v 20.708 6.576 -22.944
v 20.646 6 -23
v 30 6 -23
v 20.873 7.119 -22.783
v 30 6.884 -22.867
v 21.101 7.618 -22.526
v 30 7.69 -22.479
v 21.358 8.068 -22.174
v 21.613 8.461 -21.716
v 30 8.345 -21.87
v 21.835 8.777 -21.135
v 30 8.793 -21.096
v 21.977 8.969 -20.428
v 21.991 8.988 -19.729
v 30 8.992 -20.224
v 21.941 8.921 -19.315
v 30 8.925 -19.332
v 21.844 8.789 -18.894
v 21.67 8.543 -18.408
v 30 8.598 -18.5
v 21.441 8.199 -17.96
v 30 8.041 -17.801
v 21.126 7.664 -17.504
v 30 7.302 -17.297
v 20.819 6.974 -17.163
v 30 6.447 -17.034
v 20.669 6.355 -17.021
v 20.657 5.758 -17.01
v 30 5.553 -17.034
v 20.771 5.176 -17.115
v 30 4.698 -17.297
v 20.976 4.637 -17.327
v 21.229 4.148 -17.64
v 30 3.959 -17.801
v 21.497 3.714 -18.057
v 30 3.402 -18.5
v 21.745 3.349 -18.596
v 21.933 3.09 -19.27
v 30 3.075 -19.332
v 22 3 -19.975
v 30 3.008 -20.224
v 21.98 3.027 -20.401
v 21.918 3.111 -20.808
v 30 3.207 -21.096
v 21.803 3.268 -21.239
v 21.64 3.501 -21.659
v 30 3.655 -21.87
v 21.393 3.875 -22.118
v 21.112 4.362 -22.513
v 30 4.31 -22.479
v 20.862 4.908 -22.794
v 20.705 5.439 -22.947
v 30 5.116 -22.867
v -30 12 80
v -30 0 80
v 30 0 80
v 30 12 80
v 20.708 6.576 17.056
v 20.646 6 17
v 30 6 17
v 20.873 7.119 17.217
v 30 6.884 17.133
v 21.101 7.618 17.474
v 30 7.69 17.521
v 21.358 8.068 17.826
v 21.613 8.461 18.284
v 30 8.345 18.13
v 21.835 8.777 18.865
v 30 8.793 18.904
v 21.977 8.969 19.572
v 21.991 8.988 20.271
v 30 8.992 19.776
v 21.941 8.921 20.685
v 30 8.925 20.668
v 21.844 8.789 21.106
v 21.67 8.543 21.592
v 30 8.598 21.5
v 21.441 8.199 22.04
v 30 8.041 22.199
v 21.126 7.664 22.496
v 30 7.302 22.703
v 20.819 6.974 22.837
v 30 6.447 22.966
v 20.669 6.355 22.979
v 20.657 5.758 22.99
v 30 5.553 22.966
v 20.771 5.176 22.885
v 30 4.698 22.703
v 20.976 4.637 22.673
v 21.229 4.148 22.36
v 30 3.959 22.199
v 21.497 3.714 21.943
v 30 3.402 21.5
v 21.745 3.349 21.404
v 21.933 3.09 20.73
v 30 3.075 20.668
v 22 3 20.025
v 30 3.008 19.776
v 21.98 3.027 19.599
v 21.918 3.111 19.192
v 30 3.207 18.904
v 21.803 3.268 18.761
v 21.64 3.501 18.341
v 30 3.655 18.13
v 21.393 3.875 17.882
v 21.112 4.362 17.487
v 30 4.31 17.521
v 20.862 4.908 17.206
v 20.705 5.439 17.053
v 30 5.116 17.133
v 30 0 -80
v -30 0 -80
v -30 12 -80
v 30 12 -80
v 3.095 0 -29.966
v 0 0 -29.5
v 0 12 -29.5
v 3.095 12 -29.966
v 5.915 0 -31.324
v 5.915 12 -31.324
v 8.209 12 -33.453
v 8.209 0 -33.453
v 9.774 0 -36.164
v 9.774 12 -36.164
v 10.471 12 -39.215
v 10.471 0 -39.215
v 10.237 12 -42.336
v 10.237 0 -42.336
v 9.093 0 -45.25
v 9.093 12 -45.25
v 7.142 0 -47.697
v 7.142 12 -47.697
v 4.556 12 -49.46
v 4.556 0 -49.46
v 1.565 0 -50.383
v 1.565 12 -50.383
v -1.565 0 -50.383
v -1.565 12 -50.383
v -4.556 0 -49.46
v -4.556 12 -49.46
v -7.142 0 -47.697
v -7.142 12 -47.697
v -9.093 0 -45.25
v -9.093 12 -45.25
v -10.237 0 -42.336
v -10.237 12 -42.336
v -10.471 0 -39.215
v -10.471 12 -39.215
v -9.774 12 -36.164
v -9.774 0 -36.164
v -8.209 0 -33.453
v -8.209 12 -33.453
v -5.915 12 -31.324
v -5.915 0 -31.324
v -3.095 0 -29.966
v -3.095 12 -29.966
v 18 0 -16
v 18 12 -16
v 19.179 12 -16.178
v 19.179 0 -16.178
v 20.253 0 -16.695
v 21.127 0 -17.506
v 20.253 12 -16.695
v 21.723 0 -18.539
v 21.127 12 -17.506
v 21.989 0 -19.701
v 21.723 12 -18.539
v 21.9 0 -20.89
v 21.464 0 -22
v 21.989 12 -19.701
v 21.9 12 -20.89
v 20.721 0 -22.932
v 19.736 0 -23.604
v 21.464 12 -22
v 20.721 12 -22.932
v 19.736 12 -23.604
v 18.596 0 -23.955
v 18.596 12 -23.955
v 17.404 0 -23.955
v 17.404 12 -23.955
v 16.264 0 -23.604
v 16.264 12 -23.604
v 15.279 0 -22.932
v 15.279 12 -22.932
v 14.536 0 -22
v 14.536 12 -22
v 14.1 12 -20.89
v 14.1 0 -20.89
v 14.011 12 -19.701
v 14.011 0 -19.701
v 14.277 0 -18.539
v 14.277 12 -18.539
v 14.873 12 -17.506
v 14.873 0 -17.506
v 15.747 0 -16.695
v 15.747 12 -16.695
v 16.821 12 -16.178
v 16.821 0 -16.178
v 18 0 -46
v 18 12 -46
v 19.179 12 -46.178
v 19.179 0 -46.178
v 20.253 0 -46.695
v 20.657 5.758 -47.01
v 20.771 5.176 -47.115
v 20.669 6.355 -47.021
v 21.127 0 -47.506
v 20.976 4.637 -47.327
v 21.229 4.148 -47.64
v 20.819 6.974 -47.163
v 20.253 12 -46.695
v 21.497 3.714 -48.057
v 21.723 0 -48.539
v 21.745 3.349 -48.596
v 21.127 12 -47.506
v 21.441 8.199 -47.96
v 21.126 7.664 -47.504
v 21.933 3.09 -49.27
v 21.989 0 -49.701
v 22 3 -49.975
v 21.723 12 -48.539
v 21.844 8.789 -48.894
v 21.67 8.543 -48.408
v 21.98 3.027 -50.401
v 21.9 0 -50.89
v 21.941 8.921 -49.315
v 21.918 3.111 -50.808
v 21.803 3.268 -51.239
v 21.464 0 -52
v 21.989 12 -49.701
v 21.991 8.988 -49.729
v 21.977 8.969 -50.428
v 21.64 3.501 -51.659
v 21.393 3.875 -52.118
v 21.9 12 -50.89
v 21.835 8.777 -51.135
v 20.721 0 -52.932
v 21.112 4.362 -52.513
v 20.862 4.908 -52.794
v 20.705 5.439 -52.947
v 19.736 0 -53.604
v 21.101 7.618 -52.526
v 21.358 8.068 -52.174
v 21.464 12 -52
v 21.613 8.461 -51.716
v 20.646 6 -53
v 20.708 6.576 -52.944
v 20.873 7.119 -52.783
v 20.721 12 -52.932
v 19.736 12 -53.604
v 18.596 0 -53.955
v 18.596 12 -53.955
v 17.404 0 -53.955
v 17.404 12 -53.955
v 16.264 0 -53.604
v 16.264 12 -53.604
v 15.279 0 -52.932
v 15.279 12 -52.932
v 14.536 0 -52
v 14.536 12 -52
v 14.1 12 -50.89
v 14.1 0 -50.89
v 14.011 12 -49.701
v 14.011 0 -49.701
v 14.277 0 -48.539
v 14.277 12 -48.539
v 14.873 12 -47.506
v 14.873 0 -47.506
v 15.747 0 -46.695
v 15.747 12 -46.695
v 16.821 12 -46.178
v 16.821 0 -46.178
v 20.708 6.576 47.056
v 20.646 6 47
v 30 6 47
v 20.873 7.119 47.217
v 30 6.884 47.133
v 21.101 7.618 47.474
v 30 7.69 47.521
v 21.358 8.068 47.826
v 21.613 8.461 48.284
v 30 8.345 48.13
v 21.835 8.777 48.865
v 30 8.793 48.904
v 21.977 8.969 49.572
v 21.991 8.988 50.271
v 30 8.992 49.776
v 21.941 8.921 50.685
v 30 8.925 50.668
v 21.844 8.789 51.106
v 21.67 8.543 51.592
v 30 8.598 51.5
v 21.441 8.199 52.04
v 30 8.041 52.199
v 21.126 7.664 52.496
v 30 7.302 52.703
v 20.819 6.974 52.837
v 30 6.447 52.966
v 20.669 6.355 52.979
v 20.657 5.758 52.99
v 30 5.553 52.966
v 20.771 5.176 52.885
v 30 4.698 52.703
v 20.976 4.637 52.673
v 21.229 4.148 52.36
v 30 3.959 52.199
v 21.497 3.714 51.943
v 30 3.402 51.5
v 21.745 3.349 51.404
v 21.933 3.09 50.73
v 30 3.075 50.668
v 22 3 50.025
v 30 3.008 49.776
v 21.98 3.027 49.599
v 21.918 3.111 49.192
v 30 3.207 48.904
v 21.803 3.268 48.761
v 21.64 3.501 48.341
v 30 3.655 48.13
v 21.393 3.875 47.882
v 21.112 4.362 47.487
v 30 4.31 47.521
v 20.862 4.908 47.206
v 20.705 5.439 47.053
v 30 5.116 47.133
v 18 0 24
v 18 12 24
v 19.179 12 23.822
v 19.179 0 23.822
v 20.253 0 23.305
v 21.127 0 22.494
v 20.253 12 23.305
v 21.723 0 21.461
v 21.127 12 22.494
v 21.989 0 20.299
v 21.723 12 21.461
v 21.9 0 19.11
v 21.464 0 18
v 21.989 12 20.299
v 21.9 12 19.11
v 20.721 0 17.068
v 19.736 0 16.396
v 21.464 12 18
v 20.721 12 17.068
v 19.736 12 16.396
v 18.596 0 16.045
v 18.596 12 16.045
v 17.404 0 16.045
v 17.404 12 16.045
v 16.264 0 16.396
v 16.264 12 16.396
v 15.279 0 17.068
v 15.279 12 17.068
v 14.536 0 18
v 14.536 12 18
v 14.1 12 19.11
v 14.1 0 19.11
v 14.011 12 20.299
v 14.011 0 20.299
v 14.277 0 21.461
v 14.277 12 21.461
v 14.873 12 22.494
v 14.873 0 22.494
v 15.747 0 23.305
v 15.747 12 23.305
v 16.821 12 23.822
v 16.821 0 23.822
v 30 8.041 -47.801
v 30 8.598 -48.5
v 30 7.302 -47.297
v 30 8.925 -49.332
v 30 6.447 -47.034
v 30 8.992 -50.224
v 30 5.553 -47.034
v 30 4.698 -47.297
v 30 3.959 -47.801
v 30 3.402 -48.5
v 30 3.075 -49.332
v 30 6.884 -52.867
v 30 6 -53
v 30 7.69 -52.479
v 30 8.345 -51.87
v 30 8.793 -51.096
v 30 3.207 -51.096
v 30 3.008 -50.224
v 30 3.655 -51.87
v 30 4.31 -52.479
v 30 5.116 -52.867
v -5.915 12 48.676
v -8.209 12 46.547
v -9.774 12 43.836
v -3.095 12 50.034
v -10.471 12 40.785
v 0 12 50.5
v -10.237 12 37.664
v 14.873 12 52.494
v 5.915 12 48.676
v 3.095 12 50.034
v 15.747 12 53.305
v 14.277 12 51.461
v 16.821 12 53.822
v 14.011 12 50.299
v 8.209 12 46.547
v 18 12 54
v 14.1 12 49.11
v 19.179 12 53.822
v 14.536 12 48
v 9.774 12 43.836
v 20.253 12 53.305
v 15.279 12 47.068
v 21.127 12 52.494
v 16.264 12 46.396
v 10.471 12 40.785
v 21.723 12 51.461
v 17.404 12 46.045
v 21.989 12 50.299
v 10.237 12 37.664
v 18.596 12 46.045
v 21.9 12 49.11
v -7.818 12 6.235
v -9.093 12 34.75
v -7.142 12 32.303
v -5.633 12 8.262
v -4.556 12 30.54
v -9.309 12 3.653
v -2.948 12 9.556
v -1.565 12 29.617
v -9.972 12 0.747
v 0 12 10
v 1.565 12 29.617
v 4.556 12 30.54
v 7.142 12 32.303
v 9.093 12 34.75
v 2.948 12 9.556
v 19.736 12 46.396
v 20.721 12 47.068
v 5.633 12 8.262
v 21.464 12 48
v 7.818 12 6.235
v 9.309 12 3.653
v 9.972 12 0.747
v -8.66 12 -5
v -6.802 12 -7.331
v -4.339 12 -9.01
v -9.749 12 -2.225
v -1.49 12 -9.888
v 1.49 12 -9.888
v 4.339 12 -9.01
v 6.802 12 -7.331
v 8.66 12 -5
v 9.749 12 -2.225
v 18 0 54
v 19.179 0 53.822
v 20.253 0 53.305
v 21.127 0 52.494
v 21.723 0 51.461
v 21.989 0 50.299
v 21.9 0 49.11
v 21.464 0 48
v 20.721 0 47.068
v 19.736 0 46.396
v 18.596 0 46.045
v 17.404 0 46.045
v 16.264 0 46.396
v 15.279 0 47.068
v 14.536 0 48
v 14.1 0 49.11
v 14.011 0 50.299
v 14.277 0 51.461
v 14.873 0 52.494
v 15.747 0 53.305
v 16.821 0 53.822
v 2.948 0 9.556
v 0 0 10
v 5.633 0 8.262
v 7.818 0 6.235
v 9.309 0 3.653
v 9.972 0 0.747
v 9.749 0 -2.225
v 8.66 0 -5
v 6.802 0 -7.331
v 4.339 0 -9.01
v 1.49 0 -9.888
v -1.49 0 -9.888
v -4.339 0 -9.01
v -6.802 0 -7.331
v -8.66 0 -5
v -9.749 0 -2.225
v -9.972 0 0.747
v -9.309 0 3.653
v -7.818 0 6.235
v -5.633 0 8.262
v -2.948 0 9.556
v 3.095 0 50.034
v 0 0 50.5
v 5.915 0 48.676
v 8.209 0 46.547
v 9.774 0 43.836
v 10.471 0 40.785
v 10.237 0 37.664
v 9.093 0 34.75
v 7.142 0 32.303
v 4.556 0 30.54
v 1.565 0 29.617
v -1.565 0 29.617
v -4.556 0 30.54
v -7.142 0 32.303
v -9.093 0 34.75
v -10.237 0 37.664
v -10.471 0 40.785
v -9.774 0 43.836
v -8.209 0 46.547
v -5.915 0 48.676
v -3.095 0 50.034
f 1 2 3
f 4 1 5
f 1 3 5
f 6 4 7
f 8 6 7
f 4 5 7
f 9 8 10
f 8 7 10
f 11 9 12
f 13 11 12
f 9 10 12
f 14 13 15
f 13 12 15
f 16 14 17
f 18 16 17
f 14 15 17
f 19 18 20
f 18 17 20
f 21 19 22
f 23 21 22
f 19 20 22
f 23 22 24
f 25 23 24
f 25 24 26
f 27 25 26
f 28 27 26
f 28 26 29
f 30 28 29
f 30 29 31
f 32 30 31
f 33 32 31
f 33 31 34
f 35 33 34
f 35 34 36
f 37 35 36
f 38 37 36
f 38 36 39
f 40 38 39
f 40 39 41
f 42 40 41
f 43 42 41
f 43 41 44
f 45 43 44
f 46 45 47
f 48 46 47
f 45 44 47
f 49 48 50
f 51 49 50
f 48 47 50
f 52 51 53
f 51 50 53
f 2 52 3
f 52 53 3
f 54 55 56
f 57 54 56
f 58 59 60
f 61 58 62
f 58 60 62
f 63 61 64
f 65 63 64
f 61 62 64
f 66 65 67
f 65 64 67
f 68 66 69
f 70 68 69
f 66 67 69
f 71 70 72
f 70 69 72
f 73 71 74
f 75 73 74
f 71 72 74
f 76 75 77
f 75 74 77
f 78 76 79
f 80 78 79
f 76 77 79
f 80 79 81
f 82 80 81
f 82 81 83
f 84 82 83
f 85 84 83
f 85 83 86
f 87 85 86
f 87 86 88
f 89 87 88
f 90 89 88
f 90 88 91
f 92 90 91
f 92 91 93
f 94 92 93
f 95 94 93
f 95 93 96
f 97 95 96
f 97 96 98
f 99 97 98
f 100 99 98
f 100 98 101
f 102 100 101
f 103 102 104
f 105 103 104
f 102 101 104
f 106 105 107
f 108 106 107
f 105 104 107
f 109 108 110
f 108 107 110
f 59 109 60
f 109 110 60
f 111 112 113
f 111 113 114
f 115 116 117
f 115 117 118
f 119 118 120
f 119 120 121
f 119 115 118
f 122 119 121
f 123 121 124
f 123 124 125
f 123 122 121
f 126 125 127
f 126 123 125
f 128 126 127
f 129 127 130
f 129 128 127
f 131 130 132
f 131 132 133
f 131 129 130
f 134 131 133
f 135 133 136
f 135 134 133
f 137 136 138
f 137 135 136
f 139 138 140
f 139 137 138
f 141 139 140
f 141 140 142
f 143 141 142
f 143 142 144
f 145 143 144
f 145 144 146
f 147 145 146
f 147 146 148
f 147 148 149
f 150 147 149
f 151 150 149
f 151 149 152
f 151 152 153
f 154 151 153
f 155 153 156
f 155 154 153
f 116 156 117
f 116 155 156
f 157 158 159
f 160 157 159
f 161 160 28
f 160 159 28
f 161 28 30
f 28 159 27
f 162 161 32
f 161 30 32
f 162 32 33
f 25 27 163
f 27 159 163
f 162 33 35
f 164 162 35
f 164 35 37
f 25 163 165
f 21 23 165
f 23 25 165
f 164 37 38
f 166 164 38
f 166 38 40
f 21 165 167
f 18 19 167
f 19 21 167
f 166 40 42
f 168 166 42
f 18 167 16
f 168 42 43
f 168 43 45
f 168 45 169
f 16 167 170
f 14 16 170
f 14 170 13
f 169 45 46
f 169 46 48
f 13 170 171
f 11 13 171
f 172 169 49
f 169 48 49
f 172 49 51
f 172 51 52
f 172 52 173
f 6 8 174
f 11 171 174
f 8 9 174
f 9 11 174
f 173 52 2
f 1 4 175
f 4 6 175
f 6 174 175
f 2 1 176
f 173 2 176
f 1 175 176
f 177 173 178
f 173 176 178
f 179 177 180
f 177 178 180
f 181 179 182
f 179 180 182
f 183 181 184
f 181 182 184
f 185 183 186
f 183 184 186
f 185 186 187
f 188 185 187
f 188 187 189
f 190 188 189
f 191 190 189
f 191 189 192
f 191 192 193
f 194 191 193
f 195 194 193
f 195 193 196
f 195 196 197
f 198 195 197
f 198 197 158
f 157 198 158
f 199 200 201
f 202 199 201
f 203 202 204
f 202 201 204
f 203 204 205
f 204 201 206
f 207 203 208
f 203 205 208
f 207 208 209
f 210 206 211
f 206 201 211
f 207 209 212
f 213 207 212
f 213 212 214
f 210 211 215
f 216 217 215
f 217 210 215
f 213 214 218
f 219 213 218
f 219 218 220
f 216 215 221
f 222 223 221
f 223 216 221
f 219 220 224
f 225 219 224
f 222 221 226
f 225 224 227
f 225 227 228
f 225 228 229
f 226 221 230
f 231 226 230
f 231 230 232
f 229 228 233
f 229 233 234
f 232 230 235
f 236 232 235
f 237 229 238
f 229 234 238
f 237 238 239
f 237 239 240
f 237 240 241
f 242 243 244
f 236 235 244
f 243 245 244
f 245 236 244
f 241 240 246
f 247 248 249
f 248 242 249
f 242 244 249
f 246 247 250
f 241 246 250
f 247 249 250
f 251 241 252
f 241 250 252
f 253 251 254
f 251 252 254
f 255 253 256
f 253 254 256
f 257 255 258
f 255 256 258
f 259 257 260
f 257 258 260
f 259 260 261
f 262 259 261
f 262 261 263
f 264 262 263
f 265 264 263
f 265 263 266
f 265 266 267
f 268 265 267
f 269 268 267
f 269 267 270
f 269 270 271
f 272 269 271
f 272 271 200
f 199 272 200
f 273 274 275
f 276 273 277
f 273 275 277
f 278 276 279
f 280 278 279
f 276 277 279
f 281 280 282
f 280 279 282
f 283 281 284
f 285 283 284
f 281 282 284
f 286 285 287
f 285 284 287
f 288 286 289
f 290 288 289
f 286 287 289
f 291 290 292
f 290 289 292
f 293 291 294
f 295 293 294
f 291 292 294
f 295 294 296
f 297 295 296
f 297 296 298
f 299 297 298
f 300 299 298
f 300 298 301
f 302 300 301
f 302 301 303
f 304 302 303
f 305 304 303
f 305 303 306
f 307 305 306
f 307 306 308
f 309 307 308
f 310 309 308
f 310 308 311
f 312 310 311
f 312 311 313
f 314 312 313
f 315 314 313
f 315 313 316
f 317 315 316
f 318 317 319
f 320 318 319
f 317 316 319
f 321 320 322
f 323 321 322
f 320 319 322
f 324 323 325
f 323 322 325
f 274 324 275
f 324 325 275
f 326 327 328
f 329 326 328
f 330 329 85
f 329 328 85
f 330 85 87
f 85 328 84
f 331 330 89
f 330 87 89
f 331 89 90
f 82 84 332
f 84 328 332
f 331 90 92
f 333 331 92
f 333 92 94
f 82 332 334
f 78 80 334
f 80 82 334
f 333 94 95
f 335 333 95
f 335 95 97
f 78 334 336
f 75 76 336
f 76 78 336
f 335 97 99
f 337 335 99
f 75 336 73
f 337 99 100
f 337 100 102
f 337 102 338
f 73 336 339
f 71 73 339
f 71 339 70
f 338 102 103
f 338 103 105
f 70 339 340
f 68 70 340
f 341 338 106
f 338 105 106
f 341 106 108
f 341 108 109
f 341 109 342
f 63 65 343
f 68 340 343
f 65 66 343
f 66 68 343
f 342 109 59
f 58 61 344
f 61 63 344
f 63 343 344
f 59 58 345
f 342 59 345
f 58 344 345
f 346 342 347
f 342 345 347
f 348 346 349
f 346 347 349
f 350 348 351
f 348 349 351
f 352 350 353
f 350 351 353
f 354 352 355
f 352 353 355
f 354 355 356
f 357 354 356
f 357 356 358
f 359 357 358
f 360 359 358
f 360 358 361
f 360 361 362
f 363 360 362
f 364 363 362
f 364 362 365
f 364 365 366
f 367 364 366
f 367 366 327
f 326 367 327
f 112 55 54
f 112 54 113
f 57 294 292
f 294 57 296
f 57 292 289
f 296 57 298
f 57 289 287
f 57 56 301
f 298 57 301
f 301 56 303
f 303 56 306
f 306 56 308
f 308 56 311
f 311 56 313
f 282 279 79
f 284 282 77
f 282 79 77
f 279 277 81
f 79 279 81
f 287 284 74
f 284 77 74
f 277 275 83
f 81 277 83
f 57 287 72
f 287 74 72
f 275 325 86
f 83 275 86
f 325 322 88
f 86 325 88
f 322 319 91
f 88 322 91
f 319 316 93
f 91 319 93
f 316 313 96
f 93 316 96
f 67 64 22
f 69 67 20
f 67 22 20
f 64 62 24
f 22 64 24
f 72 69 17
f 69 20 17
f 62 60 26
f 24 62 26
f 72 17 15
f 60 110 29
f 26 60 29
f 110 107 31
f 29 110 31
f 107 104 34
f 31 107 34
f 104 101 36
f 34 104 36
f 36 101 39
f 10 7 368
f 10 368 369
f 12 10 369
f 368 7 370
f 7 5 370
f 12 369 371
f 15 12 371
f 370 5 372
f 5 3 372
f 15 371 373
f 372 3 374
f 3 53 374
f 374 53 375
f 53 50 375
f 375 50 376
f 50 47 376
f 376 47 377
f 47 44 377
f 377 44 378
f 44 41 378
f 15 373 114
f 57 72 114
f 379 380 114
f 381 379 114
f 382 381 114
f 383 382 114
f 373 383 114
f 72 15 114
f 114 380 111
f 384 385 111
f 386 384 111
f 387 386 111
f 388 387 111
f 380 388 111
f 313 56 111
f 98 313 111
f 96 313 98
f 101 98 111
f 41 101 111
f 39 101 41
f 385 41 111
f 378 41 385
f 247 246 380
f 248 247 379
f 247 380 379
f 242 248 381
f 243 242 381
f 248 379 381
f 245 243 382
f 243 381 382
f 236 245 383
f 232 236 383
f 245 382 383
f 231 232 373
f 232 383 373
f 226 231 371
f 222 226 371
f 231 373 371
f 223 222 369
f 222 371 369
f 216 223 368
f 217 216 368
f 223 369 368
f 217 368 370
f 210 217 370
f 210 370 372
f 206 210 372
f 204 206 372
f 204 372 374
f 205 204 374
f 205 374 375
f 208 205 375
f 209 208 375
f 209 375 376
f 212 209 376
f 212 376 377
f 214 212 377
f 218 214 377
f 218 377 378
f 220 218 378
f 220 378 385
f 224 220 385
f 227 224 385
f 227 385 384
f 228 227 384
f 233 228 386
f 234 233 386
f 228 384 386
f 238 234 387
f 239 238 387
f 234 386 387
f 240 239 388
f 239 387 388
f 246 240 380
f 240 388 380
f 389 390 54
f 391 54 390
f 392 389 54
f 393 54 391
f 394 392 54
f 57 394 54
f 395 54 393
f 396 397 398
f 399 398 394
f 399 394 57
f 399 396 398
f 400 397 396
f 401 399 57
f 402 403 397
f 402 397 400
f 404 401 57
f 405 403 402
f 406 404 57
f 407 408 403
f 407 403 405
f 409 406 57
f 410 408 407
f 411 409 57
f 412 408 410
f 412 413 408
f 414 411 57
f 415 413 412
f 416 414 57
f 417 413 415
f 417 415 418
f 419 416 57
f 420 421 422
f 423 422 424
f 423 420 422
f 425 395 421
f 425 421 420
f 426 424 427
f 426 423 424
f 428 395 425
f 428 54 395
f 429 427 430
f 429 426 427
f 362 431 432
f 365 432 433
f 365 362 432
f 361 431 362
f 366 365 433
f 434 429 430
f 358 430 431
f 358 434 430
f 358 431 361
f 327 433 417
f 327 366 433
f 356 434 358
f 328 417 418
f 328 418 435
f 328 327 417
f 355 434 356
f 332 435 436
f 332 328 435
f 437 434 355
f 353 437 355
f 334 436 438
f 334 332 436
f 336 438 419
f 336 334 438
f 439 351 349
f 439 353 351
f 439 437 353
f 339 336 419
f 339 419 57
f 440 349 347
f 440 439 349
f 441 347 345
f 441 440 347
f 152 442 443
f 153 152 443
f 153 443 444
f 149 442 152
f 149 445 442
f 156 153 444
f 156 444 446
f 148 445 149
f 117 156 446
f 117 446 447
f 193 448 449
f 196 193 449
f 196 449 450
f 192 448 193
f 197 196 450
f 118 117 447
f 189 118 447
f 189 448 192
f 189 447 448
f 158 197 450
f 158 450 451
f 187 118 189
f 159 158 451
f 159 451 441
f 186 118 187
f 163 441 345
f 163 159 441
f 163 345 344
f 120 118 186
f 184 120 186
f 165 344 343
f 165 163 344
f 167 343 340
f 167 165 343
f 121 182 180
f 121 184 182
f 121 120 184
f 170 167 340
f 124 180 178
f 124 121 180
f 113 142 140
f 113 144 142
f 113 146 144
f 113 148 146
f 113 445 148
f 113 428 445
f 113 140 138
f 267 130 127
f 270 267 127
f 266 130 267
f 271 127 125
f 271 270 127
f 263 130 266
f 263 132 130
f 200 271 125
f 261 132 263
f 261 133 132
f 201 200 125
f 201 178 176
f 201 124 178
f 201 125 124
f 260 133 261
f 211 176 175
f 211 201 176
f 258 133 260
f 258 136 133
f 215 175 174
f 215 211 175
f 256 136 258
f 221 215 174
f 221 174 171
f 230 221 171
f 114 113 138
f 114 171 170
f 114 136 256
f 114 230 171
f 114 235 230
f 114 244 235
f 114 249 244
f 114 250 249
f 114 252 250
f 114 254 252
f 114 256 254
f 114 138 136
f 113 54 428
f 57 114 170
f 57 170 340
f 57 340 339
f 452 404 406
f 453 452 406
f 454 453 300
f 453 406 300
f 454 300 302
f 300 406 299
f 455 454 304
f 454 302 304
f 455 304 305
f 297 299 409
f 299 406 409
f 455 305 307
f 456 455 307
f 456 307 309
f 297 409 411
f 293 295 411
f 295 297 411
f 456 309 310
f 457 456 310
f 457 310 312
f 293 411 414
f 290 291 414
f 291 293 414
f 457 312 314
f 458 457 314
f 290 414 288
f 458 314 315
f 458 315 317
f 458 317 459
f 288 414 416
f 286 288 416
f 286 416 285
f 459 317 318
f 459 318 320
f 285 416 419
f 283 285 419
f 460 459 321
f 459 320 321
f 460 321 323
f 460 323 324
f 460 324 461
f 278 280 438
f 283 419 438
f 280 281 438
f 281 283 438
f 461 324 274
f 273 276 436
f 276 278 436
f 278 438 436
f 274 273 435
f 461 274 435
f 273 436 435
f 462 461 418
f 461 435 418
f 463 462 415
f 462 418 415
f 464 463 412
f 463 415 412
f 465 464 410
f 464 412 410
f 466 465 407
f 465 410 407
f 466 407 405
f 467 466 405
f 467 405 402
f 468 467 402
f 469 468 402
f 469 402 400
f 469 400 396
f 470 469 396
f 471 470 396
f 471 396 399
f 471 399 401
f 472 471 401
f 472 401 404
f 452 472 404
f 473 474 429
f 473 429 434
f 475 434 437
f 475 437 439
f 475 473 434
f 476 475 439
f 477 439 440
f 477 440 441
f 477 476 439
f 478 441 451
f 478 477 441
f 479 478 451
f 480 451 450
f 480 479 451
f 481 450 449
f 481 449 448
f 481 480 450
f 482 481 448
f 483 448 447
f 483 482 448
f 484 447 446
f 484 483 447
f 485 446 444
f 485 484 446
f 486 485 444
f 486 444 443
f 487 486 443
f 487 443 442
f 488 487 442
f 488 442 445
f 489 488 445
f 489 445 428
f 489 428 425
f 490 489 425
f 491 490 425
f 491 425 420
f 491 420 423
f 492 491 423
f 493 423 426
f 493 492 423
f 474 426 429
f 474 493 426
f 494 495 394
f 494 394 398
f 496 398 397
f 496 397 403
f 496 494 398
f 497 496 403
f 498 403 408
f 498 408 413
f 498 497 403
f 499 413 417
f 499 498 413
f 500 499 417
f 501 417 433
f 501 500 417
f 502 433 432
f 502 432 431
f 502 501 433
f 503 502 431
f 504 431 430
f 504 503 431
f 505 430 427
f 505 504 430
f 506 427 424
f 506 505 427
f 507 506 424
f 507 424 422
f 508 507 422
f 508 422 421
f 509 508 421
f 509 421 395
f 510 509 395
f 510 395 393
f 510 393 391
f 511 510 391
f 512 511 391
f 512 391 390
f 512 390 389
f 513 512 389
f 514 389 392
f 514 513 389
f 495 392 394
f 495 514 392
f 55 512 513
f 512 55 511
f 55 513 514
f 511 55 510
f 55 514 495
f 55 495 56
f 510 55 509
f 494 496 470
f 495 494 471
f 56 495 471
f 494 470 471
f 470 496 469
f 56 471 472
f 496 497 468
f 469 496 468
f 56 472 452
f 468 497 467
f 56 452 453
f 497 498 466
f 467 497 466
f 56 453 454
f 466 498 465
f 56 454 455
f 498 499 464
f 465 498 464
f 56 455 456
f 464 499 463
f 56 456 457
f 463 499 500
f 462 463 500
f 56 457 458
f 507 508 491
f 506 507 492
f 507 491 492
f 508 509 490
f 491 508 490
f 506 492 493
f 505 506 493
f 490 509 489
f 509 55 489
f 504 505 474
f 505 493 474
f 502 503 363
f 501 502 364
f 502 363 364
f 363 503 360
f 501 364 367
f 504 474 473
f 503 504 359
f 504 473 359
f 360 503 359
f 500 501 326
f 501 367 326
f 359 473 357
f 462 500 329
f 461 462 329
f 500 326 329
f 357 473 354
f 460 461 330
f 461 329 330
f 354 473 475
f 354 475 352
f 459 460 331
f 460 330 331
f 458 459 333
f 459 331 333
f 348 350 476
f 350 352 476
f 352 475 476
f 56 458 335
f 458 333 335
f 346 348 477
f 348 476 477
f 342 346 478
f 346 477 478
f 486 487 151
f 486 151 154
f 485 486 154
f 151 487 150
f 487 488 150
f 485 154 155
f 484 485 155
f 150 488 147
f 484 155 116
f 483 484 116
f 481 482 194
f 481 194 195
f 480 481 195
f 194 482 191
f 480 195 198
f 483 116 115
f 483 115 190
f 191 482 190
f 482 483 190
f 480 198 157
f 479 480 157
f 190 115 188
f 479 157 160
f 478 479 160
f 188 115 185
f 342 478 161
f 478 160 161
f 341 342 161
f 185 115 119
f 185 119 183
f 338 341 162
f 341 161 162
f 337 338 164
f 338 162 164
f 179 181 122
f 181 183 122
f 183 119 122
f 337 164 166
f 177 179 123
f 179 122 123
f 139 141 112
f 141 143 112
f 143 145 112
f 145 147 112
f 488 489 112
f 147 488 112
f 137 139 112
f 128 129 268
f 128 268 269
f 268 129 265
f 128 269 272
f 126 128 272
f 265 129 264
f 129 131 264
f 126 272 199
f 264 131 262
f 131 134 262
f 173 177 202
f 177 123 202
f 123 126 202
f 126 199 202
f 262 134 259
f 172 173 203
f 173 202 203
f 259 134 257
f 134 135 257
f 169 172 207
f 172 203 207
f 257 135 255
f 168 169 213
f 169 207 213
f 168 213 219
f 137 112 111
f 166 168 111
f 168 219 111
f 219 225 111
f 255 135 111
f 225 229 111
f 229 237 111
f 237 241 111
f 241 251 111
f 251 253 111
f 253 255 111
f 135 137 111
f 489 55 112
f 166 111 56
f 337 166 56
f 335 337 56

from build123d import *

# Parameters (mm, degrees)
SKETCH1_W           = 60
SKETCH1_H           = 160
SKETCH1_R           = 10
SKETCH1_R_2         = 10.5
BOSS_EXTRUDE1_DEPTH = 12
CUT_EXTRUDE1_REACH  = 88.279
SKETCH2_R           = 4
CUT_EXTRUDE2_REACH  = 102.717
SKETCH3_R           = 3


with BuildPart() as part:
    # Sketch1 → Boss-Extrude1 (new body)
    with BuildSketch(Plane(origin=(0, 0, 0), x_dir=(1, 0, 0), z_dir=(0, 1, 0))):
        Rectangle(SKETCH1_W, SKETCH1_H)
        with Locations(Location((0, 0, 0), (0, 0, 270))):
            Circle(SKETCH1_R, mode=Mode.SUBTRACT)
        with Locations(Location((0, 40, 0), (0, 0, 270))):
            Circle(SKETCH1_R_2, mode=Mode.SUBTRACT)
        with Locations(Location((0, -40, 0), (0, 0, 270))):
            Circle(SKETCH1_R_2, mode=Mode.SUBTRACT)
    extrude(amount=BOSS_EXTRUDE1_DEPTH)

    # Sketch2 → Cut-Extrude1 (cut, up to next)
    with BuildSketch(Plane(origin=(0, 12, 0), x_dir=(1, 0, 0), z_dir=(0, 1, 0)), mode=Mode.PRIVATE) as cut_extrude1_sk1:
        with Locations(Location((18, 50, 0), (0, 0, 270))):
            Circle(SKETCH2_R)
    cut_extrude1_tool1 = extrude(cut_extrude1_sk1.sketch, amount=-CUT_EXTRUDE1_REACH, mode=Mode.PRIVATE) & part.part
    # Sketch2 → Cut-Extrude1 (cut, up to next)
    with BuildSketch(Plane(origin=(0, 12, 0), x_dir=(1, 0, 0), z_dir=(0, 1, 0)), mode=Mode.PRIVATE) as cut_extrude1_sk2:
        with Locations(Location((18, -50, 0), (0, 0, 270))):
            Circle(SKETCH2_R)
    cut_extrude1_tool2 = extrude(cut_extrude1_sk2.sketch, amount=-CUT_EXTRUDE1_REACH, mode=Mode.PRIVATE) & part.part
    # Sketch2 → Cut-Extrude1 (cut, up to next)
    with BuildSketch(Plane(origin=(0, 12, 0), x_dir=(1, 0, 0), z_dir=(0, 1, 0)), mode=Mode.PRIVATE) as cut_extrude1_sk3:
        with Locations(Location((18, -20, 0), (0, 0, 270))):
            Circle(SKETCH2_R)
    cut_extrude1_tool3 = extrude(cut_extrude1_sk3.sketch, amount=-CUT_EXTRUDE1_REACH, mode=Mode.PRIVATE) & part.part
    # Sketch2 → Cut-Extrude1 (cut, up to next)
    with BuildSketch(Plane(origin=(0, 12, 0), x_dir=(1, 0, 0), z_dir=(0, 1, 0)), mode=Mode.PRIVATE) as cut_extrude1_sk4:
        with Locations(Location((18, 20, 0), (0, 0, 270))):
            Circle(SKETCH2_R)
    cut_extrude1_tool4 = extrude(cut_extrude1_sk4.sketch, amount=-CUT_EXTRUDE1_REACH, mode=Mode.PRIVATE) & part.part
    add(cut_extrude1_tool1.solids().sort_by_distance((18, 12, -50))[0], mode=Mode.SUBTRACT)
    add(cut_extrude1_tool2.solids().sort_by_distance((18, 12, 50))[0], mode=Mode.SUBTRACT)
    add(cut_extrude1_tool3.solids().sort_by_distance((18, 12, 20))[0], mode=Mode.SUBTRACT)
    add(cut_extrude1_tool4.solids().sort_by_distance((18, 12, -20))[0], mode=Mode.SUBTRACT)

    # Sketch3 → Cut-Extrude2 (cut, up to next)
    with BuildSketch(Plane(origin=(30, 0, 0), x_dir=(0, 0, -1), z_dir=(1, 0, 0)), mode=Mode.PRIVATE) as cut_extrude2_sk1:
        with Locations((50, 6)):
            Circle(SKETCH3_R)
    cut_extrude2_tool1 = extrude(cut_extrude2_sk1.sketch, amount=-CUT_EXTRUDE2_REACH, mode=Mode.PRIVATE) & part.part
    # Sketch3 → Cut-Extrude2 (cut, up to next)
    with BuildSketch(Plane(origin=(30, 0, 0), x_dir=(0, 0, -1), z_dir=(1, 0, 0)), mode=Mode.PRIVATE) as cut_extrude2_sk2:
        with Locations((20, 6)):
            Circle(SKETCH3_R)
    cut_extrude2_tool2 = extrude(cut_extrude2_sk2.sketch, amount=-CUT_EXTRUDE2_REACH, mode=Mode.PRIVATE) & part.part
    # Sketch3 → Cut-Extrude2 (cut, up to next)
    with BuildSketch(Plane(origin=(30, 0, 0), x_dir=(0, 0, -1), z_dir=(1, 0, 0)), mode=Mode.PRIVATE) as cut_extrude2_sk3:
        with Locations((-20, 6)):
            Circle(SKETCH3_R)
    cut_extrude2_tool3 = extrude(cut_extrude2_sk3.sketch, amount=-CUT_EXTRUDE2_REACH, mode=Mode.PRIVATE) & part.part
    # Sketch3 → Cut-Extrude2 (cut, up to next)
    with BuildSketch(Plane(origin=(30, 0, 0), x_dir=(0, 0, -1), z_dir=(1, 0, 0)), mode=Mode.PRIVATE) as cut_extrude2_sk4:
        with Locations((-50, 6)):
            Circle(SKETCH3_R)
    cut_extrude2_tool4 = extrude(cut_extrude2_sk4.sketch, amount=-CUT_EXTRUDE2_REACH, mode=Mode.PRIVATE) & part.part
    add(cut_extrude2_tool1.solids().sort_by_distance((30, 6, -50))[0], mode=Mode.SUBTRACT)
    add(cut_extrude2_tool2.solids().sort_by_distance((30, 6, -20))[0], mode=Mode.SUBTRACT)
    add(cut_extrude2_tool3.solids().sort_by_distance((30, 6, 20))[0], mode=Mode.SUBTRACT)
    add(cut_extrude2_tool4.solids().sort_by_distance((30, 6, 50))[0], mode=Mode.SUBTRACT)


solid = part.part
